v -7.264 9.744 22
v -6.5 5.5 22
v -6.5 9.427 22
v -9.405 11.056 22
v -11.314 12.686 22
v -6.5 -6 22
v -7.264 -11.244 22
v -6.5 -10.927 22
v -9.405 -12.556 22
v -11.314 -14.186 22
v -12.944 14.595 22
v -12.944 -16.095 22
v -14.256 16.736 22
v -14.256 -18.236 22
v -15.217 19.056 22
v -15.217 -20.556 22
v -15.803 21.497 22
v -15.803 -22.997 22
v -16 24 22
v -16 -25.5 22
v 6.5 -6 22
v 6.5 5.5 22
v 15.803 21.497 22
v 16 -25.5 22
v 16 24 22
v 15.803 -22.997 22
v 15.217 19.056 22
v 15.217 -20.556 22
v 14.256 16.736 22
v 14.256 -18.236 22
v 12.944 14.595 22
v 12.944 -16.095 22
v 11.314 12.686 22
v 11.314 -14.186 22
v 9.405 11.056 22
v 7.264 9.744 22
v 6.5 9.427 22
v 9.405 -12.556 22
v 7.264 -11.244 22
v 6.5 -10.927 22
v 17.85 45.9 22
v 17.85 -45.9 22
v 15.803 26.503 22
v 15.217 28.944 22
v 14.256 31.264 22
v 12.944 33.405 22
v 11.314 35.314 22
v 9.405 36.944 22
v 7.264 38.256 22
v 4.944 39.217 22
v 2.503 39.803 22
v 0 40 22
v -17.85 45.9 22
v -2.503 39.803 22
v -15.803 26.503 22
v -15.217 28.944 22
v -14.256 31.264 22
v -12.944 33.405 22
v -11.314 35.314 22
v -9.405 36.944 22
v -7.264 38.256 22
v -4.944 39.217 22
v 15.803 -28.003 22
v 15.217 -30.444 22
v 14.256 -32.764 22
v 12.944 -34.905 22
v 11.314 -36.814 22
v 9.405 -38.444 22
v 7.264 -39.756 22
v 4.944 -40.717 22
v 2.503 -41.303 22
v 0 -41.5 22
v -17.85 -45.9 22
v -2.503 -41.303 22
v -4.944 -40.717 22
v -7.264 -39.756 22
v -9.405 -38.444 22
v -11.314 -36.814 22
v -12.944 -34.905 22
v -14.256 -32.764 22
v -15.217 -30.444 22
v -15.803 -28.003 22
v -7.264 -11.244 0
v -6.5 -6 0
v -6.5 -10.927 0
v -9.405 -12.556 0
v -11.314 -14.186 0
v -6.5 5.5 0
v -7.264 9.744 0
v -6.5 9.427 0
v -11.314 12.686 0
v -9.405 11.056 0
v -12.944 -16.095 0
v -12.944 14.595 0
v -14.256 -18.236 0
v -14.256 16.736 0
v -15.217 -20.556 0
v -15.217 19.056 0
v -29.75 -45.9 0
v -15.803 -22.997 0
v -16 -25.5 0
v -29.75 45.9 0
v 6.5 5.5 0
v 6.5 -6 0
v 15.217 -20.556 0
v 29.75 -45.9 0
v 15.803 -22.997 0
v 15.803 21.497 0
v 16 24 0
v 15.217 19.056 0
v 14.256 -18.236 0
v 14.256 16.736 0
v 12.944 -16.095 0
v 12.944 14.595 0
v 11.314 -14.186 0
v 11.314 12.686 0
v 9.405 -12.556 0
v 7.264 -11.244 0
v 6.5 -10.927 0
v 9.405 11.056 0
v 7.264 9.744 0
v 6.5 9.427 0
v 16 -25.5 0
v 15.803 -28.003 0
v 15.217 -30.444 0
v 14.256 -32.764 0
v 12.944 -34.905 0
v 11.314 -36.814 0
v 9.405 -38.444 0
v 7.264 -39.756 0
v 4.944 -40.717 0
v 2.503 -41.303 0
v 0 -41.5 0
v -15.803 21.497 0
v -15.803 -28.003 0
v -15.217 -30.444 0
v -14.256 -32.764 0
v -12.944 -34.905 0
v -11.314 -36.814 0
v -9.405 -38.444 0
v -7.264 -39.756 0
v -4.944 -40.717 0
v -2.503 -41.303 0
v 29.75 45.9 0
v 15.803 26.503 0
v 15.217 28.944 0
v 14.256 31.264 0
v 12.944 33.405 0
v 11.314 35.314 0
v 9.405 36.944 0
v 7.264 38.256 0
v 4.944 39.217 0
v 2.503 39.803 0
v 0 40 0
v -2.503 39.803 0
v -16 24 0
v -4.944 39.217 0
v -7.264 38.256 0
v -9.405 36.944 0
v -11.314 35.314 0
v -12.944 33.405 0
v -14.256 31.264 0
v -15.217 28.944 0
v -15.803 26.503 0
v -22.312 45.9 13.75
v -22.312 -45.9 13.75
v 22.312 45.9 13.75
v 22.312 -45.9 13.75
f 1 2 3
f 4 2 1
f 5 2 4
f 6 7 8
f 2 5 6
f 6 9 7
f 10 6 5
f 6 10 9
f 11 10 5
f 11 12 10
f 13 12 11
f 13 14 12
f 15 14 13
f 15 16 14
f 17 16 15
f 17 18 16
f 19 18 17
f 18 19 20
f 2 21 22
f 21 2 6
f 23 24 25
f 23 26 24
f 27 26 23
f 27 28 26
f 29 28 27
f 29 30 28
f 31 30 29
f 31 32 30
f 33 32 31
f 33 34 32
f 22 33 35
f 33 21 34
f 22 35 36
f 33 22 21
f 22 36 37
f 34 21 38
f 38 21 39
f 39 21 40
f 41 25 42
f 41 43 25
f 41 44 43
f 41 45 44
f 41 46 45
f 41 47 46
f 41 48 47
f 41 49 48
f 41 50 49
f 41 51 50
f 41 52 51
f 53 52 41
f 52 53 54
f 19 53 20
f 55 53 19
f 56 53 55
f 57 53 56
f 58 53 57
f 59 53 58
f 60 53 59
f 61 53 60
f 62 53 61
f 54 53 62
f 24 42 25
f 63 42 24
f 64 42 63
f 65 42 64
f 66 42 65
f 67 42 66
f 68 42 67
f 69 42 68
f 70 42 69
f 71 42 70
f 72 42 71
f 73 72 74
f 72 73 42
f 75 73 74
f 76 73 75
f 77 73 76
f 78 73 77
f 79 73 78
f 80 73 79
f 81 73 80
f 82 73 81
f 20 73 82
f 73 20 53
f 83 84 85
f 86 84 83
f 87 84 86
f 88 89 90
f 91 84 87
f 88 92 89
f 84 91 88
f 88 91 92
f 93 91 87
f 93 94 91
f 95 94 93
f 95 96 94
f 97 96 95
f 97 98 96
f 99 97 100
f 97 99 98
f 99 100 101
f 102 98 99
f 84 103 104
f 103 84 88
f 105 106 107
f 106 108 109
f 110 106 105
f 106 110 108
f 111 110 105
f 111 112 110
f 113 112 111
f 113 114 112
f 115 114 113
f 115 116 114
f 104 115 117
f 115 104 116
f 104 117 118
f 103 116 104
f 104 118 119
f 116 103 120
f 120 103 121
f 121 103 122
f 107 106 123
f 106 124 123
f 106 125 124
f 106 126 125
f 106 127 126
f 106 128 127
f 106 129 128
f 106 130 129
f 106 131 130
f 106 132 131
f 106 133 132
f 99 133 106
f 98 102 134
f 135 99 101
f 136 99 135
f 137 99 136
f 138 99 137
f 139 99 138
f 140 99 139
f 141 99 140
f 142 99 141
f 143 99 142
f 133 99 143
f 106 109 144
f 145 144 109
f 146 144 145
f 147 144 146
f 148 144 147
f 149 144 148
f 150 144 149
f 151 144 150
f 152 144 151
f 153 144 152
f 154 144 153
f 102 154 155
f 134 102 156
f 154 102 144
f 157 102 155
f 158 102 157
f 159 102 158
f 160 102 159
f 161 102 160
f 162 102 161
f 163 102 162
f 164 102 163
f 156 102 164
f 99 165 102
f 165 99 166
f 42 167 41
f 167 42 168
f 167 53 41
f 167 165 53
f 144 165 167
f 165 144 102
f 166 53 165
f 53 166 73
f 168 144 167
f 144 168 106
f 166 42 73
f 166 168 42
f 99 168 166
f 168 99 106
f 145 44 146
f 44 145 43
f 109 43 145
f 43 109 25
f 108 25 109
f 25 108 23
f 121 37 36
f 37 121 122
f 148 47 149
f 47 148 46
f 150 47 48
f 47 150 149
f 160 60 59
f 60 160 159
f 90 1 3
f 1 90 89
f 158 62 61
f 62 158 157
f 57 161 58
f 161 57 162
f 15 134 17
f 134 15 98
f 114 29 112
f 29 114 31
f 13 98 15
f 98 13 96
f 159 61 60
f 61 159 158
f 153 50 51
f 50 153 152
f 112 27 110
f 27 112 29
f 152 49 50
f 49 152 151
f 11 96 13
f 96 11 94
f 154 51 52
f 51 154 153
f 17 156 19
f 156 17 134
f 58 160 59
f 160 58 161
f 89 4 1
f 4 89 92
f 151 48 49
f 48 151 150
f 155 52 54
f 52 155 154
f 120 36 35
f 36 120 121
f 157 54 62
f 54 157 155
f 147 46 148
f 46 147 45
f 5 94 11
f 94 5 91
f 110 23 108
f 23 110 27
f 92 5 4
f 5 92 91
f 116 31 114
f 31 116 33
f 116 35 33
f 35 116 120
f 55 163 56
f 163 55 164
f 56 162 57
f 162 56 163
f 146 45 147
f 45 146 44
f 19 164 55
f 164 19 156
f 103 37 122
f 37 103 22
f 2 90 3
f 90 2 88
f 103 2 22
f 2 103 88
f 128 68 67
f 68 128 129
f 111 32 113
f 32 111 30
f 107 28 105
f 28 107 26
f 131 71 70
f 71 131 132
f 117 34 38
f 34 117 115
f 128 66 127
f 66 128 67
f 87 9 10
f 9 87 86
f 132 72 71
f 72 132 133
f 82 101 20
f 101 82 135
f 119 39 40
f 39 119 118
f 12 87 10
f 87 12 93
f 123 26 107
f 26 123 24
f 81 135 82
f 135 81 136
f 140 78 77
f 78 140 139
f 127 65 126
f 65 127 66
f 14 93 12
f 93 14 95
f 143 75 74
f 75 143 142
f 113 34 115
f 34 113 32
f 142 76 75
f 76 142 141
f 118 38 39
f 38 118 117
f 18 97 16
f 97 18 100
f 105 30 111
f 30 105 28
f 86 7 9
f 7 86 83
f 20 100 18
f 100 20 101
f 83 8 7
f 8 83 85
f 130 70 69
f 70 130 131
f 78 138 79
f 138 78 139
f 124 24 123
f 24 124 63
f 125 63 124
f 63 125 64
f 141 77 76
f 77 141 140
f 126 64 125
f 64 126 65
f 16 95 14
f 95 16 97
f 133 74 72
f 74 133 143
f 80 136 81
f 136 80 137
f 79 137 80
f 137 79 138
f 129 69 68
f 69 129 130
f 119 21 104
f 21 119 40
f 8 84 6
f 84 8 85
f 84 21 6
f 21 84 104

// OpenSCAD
diam = 32;
diam2 = 34;
height=22;
rect_width=13;
rect_depth=5;

$fn=40;

max_diam = max(diam, diam2);

difference() {
    linear_extrude(height,scale=[0.6,1]) square([1.75*max_diam,2.7*max_diam],center=true);


    offs=diam*0.75;
    translate([0,offs,height/2])cylinder(r=diam/2,h=height+0.1,center=true); 
 
   translate([0,-diam/2+offs,height/2])cube([rect_width,rect_depth,height+0.1],center=true);

    offs2 = -diam2*0.75;

    translate([0,offs2,height/2])cylinder(r=diam/2,h=height+0.1,center=true); 
 
   translate([0,+diam2/2+offs2,height/2])cube([rect_width,rect_depth,height+0.1],center=true);

}

 
